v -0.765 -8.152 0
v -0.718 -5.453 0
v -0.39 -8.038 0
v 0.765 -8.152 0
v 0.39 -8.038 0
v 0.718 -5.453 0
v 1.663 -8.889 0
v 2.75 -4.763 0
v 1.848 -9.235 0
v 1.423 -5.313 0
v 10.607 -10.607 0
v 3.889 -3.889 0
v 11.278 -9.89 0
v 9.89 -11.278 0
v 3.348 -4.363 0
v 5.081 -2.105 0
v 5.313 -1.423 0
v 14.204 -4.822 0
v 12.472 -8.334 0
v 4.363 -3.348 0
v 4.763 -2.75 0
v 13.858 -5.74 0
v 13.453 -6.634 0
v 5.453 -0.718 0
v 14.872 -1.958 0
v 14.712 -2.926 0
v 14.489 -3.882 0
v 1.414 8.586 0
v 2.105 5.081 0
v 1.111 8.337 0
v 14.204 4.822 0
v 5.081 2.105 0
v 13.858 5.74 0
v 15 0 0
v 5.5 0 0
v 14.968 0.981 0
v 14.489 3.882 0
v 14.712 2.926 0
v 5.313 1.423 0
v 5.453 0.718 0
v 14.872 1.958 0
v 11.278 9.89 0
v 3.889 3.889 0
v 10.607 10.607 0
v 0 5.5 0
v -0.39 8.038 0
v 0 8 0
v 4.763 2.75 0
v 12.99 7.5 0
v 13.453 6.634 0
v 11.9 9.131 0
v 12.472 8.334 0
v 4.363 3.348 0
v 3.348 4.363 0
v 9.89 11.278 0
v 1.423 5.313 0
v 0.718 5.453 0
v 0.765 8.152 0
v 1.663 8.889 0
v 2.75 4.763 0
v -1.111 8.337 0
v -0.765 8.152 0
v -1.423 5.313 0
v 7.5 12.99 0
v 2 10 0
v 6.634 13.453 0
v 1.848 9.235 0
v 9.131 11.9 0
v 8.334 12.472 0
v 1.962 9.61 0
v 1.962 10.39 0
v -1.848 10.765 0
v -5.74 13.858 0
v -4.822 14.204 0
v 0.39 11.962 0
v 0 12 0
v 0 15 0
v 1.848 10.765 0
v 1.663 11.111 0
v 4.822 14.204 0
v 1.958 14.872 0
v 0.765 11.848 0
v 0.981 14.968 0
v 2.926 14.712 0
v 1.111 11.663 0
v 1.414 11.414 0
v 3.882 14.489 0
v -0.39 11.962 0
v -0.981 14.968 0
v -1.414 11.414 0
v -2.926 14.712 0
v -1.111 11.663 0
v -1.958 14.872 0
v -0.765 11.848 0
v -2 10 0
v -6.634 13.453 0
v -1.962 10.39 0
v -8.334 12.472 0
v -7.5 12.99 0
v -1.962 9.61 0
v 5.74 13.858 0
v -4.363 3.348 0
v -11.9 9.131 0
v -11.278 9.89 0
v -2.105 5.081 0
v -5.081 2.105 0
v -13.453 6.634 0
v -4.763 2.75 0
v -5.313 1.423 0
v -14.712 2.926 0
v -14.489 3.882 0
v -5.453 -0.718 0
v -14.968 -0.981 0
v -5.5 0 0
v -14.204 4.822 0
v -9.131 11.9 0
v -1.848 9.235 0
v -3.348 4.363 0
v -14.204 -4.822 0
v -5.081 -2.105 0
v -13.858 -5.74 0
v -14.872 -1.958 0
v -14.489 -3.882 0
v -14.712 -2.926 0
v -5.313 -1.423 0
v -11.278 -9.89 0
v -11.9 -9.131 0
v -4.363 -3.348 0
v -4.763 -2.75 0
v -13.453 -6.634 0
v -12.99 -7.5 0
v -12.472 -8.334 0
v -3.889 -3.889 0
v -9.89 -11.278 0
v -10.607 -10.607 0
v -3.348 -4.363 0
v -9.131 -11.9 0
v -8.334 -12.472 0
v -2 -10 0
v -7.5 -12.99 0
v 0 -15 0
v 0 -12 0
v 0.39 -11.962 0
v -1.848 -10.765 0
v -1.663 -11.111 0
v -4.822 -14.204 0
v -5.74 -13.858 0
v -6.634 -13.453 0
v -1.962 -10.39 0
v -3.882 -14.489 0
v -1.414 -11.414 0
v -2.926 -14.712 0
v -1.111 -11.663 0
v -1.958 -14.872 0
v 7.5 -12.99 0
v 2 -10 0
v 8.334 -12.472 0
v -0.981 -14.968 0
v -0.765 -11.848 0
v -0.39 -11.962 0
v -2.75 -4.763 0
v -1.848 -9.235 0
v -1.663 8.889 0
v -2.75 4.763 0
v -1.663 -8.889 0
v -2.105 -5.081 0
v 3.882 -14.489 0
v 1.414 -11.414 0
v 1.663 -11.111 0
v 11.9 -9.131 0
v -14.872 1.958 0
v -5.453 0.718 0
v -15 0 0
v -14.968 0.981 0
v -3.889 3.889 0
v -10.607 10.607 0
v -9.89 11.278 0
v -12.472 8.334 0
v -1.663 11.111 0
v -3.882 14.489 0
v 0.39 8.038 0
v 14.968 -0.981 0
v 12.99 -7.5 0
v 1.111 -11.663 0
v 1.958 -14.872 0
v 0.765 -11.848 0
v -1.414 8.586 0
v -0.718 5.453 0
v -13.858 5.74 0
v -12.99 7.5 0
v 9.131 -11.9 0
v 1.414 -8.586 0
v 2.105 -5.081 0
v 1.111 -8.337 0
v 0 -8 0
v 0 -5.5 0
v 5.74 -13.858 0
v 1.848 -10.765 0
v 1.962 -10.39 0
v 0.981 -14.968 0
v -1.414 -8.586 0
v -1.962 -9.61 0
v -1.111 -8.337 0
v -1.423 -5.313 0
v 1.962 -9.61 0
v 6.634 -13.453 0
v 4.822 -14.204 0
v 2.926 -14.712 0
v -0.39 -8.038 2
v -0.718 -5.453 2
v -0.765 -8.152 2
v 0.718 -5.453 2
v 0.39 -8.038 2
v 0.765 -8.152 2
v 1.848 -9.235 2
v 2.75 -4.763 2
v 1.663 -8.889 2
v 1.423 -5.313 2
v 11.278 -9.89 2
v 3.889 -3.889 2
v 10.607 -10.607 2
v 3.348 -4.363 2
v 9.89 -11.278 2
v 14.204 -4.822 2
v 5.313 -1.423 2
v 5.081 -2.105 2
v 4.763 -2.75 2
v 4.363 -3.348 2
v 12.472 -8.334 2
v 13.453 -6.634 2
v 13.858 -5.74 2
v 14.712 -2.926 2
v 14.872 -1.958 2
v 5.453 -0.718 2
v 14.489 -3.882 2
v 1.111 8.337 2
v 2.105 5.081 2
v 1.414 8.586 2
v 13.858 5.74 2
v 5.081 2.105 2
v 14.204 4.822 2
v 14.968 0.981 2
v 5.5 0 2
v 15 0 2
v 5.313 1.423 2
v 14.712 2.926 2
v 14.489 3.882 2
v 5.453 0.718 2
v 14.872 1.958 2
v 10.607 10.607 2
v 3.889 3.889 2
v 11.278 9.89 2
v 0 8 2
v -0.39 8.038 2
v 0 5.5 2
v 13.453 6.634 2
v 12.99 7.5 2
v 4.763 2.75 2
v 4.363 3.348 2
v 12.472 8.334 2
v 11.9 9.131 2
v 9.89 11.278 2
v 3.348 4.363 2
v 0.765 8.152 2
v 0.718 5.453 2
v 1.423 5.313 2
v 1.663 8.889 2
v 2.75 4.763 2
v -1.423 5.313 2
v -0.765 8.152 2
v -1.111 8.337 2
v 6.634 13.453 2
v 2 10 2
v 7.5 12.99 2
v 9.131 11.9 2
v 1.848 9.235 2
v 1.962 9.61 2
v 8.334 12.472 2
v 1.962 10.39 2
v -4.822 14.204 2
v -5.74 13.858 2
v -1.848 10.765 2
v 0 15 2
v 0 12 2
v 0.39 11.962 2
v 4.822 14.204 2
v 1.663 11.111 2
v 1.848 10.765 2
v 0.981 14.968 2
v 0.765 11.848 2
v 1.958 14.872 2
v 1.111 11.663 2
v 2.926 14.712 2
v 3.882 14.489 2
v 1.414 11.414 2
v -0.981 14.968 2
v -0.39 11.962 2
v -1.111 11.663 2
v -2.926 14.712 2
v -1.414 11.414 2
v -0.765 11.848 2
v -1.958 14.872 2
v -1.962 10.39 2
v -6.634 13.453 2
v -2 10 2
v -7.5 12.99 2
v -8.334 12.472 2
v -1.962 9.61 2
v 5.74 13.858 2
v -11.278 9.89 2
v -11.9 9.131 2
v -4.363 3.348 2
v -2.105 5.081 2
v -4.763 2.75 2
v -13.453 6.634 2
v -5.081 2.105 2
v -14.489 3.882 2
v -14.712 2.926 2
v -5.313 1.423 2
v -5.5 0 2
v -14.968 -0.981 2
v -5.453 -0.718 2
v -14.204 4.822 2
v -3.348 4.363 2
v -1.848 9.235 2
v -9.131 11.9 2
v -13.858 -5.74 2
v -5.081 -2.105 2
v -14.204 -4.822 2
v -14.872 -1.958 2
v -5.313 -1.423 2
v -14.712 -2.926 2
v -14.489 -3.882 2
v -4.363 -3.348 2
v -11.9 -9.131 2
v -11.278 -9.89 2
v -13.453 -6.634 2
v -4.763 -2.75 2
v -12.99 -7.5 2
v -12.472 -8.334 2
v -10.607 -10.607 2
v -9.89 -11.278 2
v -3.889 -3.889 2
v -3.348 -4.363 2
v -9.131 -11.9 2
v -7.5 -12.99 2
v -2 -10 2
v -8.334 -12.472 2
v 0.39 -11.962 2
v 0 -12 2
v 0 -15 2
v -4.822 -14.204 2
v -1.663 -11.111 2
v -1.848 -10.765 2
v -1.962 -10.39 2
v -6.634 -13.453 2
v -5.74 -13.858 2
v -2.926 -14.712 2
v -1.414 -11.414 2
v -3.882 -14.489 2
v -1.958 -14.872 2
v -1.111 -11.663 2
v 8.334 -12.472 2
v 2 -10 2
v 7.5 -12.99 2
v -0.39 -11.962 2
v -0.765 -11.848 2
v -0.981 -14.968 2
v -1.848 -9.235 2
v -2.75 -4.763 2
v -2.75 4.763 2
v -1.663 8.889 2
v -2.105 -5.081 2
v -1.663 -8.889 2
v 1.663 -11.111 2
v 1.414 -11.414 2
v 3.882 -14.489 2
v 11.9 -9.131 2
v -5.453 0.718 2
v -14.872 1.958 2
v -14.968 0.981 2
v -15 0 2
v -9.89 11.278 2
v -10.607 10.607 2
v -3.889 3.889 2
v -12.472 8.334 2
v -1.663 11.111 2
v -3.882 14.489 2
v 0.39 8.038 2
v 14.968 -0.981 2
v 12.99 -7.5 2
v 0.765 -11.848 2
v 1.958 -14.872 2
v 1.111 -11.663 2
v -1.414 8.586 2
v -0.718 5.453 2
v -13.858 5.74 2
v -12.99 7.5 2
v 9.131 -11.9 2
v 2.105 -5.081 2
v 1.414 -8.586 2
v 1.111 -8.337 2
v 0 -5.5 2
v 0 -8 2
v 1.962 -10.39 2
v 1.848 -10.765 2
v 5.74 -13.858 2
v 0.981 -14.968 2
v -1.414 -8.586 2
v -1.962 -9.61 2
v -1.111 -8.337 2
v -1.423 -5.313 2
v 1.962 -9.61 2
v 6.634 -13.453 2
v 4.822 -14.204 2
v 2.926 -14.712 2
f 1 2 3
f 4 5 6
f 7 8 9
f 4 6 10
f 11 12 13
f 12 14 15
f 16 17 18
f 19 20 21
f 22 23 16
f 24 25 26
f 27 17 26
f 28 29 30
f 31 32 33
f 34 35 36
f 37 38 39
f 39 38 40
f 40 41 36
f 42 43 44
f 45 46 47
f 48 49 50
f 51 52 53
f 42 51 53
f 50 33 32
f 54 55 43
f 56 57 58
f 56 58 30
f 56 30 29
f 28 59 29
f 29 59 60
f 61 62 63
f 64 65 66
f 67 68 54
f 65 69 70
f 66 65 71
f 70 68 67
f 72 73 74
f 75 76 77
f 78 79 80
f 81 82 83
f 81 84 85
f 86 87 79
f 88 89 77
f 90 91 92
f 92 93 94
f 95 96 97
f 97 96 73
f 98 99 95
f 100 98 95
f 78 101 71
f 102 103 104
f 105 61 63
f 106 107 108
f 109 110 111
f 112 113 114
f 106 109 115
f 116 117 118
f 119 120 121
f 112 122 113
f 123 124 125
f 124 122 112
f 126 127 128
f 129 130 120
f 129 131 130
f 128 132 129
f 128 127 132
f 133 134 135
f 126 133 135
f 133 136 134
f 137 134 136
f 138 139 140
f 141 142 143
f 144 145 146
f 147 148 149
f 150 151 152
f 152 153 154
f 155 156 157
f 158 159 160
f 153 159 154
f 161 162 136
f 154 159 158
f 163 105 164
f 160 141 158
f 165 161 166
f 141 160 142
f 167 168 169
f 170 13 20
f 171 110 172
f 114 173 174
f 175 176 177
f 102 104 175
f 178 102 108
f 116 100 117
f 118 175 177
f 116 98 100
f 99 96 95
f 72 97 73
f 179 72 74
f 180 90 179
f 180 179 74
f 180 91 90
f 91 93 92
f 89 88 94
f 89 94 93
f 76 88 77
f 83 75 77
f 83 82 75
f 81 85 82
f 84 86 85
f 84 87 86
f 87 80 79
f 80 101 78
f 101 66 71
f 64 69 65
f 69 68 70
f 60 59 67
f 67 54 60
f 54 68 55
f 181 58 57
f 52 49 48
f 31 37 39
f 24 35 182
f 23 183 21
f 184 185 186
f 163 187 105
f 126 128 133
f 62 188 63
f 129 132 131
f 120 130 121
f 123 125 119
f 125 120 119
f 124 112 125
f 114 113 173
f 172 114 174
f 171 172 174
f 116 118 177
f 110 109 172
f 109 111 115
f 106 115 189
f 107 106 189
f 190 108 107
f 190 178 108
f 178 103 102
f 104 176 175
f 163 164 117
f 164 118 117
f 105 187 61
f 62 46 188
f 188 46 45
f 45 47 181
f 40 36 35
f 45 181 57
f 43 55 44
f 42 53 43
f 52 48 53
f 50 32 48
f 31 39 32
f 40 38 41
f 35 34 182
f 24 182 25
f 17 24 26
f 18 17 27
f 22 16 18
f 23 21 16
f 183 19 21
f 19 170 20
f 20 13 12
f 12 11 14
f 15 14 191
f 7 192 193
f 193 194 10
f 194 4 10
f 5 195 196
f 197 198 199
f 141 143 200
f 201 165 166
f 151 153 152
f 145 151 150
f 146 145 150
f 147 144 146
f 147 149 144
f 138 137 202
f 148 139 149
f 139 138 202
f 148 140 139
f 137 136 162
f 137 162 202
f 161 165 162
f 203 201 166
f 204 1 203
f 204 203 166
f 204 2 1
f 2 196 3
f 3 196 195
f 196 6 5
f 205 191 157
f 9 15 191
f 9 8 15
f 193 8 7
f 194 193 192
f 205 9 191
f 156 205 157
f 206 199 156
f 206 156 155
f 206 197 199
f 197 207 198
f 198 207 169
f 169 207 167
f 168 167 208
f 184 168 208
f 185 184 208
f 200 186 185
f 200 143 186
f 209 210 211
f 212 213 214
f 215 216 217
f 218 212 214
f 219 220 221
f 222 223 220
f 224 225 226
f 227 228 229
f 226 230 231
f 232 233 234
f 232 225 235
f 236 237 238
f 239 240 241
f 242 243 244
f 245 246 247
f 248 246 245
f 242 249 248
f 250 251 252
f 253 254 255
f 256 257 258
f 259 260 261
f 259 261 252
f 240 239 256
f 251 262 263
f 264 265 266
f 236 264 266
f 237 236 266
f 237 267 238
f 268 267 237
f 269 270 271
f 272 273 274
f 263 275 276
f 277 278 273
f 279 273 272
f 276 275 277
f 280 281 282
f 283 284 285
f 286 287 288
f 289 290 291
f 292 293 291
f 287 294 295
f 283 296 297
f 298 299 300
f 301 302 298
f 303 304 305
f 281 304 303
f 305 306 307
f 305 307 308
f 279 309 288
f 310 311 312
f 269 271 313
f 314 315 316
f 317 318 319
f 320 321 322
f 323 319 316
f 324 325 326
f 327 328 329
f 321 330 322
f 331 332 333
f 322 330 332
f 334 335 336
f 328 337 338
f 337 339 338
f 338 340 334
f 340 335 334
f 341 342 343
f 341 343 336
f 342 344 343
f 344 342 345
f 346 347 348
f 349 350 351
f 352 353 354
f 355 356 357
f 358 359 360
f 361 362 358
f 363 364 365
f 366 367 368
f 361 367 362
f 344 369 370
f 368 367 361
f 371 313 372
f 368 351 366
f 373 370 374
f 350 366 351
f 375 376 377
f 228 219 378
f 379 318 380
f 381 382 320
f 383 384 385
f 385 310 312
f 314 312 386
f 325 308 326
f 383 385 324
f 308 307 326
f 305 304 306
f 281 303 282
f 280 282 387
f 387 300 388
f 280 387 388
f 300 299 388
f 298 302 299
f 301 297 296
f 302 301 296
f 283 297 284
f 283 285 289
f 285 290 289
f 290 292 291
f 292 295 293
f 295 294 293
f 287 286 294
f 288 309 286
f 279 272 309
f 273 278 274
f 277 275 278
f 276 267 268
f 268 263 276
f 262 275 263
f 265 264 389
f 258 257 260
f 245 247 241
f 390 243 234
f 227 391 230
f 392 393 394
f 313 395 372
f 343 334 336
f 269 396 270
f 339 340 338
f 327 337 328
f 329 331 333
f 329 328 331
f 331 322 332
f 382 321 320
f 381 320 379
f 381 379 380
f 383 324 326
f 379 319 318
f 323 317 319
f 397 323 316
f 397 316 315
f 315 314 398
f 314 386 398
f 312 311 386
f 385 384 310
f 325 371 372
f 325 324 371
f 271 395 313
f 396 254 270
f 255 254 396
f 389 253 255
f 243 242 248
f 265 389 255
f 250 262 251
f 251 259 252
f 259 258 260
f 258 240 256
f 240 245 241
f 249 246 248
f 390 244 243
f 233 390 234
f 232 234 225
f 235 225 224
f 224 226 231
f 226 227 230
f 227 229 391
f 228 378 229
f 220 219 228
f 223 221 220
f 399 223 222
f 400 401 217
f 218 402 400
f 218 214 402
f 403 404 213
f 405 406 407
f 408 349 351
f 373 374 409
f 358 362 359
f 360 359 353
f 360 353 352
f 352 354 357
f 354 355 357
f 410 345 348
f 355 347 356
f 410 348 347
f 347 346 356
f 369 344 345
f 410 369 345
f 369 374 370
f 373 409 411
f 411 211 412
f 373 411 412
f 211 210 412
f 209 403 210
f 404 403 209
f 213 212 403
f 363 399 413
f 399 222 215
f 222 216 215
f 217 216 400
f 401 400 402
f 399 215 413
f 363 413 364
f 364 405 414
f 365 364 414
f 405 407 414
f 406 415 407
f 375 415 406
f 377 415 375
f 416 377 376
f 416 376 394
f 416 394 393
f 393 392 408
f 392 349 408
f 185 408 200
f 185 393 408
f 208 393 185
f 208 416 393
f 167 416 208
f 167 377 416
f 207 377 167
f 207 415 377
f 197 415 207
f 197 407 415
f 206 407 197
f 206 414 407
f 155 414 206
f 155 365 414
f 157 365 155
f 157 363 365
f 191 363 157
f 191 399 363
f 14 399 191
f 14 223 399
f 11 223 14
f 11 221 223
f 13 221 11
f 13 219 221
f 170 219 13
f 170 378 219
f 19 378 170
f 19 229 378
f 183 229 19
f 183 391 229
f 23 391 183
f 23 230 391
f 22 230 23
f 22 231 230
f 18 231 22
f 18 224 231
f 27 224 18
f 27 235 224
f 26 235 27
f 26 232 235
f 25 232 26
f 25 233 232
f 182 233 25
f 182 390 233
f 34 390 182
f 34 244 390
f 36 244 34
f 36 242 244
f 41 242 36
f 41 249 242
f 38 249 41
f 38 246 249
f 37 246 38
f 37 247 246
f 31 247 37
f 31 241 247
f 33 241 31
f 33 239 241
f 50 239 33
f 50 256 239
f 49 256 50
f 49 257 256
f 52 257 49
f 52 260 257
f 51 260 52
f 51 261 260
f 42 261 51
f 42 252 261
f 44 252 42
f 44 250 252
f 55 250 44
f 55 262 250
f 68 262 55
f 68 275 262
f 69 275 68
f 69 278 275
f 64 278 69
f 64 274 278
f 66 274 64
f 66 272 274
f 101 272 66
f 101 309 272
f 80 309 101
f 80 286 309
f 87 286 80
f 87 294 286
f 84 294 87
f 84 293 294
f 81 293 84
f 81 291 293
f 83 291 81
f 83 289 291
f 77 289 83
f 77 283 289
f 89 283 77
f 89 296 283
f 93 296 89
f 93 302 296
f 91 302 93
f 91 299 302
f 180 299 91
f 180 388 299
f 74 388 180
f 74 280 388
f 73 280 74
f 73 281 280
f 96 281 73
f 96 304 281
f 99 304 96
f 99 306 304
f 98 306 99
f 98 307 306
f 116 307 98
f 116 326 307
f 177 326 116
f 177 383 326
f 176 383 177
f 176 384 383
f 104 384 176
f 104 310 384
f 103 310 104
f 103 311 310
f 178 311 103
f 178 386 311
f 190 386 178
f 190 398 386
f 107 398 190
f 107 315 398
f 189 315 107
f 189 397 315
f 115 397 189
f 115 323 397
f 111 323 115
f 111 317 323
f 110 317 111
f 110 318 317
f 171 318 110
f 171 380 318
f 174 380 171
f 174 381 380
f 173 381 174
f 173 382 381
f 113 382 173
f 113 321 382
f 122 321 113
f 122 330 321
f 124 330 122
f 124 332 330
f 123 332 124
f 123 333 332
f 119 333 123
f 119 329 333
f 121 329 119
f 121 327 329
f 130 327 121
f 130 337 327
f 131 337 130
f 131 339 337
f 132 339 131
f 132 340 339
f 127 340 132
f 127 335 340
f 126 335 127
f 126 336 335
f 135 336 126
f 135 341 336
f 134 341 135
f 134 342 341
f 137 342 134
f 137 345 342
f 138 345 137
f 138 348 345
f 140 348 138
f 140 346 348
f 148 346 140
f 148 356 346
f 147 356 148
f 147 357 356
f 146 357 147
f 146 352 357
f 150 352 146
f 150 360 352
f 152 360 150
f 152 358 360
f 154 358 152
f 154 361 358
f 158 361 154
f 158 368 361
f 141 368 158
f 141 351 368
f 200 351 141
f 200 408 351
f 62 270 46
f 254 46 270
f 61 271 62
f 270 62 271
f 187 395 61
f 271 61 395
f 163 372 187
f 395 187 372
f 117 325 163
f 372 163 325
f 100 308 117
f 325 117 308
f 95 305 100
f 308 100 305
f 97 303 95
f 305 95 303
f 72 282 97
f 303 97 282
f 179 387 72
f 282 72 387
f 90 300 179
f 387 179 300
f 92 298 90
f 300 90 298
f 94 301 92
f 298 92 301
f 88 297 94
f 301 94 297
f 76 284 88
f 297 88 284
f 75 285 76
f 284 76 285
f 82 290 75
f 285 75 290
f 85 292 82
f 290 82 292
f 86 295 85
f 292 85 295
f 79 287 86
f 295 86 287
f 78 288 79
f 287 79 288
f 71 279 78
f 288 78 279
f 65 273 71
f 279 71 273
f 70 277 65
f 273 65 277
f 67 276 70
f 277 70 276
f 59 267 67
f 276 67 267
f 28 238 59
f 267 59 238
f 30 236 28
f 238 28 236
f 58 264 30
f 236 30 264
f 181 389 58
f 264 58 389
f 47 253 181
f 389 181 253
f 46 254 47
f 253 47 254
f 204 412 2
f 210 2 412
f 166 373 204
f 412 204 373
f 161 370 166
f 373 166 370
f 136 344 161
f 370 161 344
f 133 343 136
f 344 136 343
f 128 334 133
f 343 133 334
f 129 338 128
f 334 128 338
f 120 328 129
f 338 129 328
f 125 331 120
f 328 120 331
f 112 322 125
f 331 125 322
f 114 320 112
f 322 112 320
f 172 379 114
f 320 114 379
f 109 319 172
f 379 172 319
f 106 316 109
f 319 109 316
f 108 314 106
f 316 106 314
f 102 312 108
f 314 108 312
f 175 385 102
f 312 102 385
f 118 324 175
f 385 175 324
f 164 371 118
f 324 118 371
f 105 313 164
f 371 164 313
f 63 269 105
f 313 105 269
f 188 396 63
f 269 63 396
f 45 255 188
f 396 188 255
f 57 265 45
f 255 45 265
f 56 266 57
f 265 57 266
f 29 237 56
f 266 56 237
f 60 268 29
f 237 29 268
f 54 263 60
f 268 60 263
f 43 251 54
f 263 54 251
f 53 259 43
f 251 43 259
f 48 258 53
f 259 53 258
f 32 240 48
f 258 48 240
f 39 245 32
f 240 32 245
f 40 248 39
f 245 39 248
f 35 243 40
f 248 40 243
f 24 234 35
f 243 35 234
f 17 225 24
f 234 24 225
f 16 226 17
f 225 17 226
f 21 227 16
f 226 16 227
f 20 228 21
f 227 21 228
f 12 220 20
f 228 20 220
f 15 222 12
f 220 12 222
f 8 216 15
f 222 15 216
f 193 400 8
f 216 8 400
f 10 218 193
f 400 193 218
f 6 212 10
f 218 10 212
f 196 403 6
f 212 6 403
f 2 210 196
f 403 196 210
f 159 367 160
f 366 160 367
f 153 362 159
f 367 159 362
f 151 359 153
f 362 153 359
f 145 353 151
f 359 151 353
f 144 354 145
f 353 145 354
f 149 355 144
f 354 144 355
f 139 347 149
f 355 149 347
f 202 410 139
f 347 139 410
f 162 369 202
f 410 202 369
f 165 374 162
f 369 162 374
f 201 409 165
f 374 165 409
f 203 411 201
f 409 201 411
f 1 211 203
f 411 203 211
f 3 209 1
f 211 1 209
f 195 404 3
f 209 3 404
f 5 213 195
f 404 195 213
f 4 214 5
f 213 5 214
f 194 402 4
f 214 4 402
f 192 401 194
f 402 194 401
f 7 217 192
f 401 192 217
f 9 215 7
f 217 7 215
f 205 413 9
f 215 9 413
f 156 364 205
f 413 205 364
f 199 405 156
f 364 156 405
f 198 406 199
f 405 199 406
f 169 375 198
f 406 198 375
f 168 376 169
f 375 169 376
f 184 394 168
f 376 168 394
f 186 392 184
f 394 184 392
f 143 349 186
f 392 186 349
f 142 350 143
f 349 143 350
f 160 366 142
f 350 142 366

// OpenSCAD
// part_id: b10
// name: B10 disc plate
// source_drawing_ids: DRW-002
// units: mm
// revision: 0.1
// SPDX-License-Identifier: MIT

module b10_profile_2d(od = 30, bore_d = 11, hole_d = 4, hole_pitch = 20) {
    difference() {
        circle(d = od, $fn = 96);
        circle(d = bore_d, $fn = 48);
        for (a = [90, 270])
            rotate(a) translate([hole_pitch / 2, 0]) circle(d = hole_d, $fn = 32);
    }
}

module part_b10(od = 30, thickness = 2.0) {
    linear_extrude(height = thickness)
        b10_profile_2d(od = od);
}

// ---- "main guard" ----
// Default to previewing when opened directly:
if (is_undef(__LIB_MODE__)) {
    part_b10();
}
